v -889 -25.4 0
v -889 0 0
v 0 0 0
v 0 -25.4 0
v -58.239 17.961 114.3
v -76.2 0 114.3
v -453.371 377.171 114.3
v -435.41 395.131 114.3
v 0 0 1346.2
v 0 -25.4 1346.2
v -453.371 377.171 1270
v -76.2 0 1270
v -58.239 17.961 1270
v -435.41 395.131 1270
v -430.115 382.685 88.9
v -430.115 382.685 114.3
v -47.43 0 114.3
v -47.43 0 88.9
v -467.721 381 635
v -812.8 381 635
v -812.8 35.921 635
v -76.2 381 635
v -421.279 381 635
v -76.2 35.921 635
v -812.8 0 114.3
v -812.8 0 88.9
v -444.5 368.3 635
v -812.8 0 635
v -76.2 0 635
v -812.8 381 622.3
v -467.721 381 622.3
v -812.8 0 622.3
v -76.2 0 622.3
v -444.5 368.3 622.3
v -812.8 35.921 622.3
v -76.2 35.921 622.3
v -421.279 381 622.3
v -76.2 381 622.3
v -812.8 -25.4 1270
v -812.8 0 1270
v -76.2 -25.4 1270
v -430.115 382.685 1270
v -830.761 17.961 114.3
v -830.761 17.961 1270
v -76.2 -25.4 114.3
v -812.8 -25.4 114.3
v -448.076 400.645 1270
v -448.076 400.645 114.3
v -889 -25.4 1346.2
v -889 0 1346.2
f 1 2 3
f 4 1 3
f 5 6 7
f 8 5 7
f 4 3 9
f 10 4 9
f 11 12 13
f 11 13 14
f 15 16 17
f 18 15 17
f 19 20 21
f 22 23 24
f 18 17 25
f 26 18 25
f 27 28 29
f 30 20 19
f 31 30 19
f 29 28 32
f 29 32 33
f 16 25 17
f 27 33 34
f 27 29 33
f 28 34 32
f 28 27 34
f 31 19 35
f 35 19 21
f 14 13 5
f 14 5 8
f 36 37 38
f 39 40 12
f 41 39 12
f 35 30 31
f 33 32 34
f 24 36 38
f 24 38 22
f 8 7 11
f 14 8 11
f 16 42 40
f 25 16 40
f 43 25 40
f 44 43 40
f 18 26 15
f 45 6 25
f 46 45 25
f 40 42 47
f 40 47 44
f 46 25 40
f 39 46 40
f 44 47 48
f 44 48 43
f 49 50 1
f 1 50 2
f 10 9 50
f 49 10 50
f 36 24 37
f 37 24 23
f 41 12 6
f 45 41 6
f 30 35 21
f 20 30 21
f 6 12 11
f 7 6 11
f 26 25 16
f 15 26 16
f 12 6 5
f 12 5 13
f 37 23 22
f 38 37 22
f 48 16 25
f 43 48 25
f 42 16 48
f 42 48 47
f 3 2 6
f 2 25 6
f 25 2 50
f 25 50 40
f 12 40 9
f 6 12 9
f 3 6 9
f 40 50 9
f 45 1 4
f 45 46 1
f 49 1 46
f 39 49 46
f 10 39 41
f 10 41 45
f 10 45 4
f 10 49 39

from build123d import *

# Parameters (mm, degrees)
F0_W      = 76.2
F0_H      = 114.3
F0_W_2    = 736.6
F0_H_2    = 1155.7
F0_H_3    = 76.2
F1_DEPTH  = 25.4
F2_W      = 736.6
F2_H      = 12.7
F3_DEPTH  = 381
F5_W      = 533.4
F5_H      = 1155.7
F6_DEPTH  = 25.4
F8_W      = 541.198207
F8_H      = 1155.7
F9_DEPTH  = 25.4
F11_DEPTH = 25.4


with BuildPart() as f1:
    # F0 (on Front) → F1 (new body)
    with BuildSketch(Plane.XZ):
        with Locations((-38.1, 57.15)):
            Rectangle(F0_W, F0_H)
        with Locations((-444.5, 57.15)):
            Rectangle(F0_W_2, F0_H)
        with Locations((-38.1, 692.15)):
            Rectangle(F0_W, F0_H_2)
        with Locations((-850.9, 57.15)):
            Rectangle(F0_W, F0_H)
        with Locations((-38.1, 1308.1)):
            Rectangle(F0_W, F0_H_3)
        with Locations((-850.9, 692.15)):
            Rectangle(F0_W, F0_H_2)
        with Locations((-444.5, 1308.1)):
            Rectangle(F0_W_2, F0_H_3)
        with Locations((-850.9, 1308.1)):
            Rectangle(F0_W, F0_H_3)
    extrude(amount=F1_DEPTH)


with BuildPart() as f3:
    # F2 (on Front) → F3 (new body)
    with BuildSketch(Plane.XZ):
        with Locations((-444.5, 628.65)):
            Rectangle(F2_W, F2_H)
    extrude(amount=-F3_DEPTH)


with BuildPart() as f6:
    # F5 (on face) → F6 (new body)
    with BuildSketch(Plane(origin=(-38.1, -38.1, 0), x_dir=(-0.707107, 0.707107, 0), z_dir=(0.707107, 0.707107, 0))):
        with Locations((320.581537, 692.15)):
            Rectangle(F5_W, F5_H)
    extrude(amount=F6_DEPTH)


with BuildPart() as f9:
    # F8 (on face) → F9 (new body)
    with BuildSketch(Plane(origin=(-406.4, 406.4, 0), x_dir=(-0.707107, -0.707107, 0), z_dir=(-0.707107, 0.707107, 0))):
        with Locations((304.137289, 692.15)):
            Rectangle(F8_W, F8_H)
    extrude(amount=F9_DEPTH)


with BuildPart() as f11:
    # F10 (on face) → F11 (new body)
    with BuildSketch(Plane(origin=(0, 0, 114.3), x_dir=(1, 0, 0), z_dir=(0, 0, -1))):
        Polygon((-47.430156, 0), (-812.8, 0), (-430.115078, -382.684922), align=None)
    extrude(amount=F11_DEPTH)


with BuildPart() as f3_1:
    add(f3.part)

    # F12: cut F9, F6
    add(f9.part, mode=Mode.SUBTRACT)
    add(f6.part, mode=Mode.SUBTRACT)


solid = Compound([f1.part, f6.part, f9.part, f11.part, f3_1.part])
